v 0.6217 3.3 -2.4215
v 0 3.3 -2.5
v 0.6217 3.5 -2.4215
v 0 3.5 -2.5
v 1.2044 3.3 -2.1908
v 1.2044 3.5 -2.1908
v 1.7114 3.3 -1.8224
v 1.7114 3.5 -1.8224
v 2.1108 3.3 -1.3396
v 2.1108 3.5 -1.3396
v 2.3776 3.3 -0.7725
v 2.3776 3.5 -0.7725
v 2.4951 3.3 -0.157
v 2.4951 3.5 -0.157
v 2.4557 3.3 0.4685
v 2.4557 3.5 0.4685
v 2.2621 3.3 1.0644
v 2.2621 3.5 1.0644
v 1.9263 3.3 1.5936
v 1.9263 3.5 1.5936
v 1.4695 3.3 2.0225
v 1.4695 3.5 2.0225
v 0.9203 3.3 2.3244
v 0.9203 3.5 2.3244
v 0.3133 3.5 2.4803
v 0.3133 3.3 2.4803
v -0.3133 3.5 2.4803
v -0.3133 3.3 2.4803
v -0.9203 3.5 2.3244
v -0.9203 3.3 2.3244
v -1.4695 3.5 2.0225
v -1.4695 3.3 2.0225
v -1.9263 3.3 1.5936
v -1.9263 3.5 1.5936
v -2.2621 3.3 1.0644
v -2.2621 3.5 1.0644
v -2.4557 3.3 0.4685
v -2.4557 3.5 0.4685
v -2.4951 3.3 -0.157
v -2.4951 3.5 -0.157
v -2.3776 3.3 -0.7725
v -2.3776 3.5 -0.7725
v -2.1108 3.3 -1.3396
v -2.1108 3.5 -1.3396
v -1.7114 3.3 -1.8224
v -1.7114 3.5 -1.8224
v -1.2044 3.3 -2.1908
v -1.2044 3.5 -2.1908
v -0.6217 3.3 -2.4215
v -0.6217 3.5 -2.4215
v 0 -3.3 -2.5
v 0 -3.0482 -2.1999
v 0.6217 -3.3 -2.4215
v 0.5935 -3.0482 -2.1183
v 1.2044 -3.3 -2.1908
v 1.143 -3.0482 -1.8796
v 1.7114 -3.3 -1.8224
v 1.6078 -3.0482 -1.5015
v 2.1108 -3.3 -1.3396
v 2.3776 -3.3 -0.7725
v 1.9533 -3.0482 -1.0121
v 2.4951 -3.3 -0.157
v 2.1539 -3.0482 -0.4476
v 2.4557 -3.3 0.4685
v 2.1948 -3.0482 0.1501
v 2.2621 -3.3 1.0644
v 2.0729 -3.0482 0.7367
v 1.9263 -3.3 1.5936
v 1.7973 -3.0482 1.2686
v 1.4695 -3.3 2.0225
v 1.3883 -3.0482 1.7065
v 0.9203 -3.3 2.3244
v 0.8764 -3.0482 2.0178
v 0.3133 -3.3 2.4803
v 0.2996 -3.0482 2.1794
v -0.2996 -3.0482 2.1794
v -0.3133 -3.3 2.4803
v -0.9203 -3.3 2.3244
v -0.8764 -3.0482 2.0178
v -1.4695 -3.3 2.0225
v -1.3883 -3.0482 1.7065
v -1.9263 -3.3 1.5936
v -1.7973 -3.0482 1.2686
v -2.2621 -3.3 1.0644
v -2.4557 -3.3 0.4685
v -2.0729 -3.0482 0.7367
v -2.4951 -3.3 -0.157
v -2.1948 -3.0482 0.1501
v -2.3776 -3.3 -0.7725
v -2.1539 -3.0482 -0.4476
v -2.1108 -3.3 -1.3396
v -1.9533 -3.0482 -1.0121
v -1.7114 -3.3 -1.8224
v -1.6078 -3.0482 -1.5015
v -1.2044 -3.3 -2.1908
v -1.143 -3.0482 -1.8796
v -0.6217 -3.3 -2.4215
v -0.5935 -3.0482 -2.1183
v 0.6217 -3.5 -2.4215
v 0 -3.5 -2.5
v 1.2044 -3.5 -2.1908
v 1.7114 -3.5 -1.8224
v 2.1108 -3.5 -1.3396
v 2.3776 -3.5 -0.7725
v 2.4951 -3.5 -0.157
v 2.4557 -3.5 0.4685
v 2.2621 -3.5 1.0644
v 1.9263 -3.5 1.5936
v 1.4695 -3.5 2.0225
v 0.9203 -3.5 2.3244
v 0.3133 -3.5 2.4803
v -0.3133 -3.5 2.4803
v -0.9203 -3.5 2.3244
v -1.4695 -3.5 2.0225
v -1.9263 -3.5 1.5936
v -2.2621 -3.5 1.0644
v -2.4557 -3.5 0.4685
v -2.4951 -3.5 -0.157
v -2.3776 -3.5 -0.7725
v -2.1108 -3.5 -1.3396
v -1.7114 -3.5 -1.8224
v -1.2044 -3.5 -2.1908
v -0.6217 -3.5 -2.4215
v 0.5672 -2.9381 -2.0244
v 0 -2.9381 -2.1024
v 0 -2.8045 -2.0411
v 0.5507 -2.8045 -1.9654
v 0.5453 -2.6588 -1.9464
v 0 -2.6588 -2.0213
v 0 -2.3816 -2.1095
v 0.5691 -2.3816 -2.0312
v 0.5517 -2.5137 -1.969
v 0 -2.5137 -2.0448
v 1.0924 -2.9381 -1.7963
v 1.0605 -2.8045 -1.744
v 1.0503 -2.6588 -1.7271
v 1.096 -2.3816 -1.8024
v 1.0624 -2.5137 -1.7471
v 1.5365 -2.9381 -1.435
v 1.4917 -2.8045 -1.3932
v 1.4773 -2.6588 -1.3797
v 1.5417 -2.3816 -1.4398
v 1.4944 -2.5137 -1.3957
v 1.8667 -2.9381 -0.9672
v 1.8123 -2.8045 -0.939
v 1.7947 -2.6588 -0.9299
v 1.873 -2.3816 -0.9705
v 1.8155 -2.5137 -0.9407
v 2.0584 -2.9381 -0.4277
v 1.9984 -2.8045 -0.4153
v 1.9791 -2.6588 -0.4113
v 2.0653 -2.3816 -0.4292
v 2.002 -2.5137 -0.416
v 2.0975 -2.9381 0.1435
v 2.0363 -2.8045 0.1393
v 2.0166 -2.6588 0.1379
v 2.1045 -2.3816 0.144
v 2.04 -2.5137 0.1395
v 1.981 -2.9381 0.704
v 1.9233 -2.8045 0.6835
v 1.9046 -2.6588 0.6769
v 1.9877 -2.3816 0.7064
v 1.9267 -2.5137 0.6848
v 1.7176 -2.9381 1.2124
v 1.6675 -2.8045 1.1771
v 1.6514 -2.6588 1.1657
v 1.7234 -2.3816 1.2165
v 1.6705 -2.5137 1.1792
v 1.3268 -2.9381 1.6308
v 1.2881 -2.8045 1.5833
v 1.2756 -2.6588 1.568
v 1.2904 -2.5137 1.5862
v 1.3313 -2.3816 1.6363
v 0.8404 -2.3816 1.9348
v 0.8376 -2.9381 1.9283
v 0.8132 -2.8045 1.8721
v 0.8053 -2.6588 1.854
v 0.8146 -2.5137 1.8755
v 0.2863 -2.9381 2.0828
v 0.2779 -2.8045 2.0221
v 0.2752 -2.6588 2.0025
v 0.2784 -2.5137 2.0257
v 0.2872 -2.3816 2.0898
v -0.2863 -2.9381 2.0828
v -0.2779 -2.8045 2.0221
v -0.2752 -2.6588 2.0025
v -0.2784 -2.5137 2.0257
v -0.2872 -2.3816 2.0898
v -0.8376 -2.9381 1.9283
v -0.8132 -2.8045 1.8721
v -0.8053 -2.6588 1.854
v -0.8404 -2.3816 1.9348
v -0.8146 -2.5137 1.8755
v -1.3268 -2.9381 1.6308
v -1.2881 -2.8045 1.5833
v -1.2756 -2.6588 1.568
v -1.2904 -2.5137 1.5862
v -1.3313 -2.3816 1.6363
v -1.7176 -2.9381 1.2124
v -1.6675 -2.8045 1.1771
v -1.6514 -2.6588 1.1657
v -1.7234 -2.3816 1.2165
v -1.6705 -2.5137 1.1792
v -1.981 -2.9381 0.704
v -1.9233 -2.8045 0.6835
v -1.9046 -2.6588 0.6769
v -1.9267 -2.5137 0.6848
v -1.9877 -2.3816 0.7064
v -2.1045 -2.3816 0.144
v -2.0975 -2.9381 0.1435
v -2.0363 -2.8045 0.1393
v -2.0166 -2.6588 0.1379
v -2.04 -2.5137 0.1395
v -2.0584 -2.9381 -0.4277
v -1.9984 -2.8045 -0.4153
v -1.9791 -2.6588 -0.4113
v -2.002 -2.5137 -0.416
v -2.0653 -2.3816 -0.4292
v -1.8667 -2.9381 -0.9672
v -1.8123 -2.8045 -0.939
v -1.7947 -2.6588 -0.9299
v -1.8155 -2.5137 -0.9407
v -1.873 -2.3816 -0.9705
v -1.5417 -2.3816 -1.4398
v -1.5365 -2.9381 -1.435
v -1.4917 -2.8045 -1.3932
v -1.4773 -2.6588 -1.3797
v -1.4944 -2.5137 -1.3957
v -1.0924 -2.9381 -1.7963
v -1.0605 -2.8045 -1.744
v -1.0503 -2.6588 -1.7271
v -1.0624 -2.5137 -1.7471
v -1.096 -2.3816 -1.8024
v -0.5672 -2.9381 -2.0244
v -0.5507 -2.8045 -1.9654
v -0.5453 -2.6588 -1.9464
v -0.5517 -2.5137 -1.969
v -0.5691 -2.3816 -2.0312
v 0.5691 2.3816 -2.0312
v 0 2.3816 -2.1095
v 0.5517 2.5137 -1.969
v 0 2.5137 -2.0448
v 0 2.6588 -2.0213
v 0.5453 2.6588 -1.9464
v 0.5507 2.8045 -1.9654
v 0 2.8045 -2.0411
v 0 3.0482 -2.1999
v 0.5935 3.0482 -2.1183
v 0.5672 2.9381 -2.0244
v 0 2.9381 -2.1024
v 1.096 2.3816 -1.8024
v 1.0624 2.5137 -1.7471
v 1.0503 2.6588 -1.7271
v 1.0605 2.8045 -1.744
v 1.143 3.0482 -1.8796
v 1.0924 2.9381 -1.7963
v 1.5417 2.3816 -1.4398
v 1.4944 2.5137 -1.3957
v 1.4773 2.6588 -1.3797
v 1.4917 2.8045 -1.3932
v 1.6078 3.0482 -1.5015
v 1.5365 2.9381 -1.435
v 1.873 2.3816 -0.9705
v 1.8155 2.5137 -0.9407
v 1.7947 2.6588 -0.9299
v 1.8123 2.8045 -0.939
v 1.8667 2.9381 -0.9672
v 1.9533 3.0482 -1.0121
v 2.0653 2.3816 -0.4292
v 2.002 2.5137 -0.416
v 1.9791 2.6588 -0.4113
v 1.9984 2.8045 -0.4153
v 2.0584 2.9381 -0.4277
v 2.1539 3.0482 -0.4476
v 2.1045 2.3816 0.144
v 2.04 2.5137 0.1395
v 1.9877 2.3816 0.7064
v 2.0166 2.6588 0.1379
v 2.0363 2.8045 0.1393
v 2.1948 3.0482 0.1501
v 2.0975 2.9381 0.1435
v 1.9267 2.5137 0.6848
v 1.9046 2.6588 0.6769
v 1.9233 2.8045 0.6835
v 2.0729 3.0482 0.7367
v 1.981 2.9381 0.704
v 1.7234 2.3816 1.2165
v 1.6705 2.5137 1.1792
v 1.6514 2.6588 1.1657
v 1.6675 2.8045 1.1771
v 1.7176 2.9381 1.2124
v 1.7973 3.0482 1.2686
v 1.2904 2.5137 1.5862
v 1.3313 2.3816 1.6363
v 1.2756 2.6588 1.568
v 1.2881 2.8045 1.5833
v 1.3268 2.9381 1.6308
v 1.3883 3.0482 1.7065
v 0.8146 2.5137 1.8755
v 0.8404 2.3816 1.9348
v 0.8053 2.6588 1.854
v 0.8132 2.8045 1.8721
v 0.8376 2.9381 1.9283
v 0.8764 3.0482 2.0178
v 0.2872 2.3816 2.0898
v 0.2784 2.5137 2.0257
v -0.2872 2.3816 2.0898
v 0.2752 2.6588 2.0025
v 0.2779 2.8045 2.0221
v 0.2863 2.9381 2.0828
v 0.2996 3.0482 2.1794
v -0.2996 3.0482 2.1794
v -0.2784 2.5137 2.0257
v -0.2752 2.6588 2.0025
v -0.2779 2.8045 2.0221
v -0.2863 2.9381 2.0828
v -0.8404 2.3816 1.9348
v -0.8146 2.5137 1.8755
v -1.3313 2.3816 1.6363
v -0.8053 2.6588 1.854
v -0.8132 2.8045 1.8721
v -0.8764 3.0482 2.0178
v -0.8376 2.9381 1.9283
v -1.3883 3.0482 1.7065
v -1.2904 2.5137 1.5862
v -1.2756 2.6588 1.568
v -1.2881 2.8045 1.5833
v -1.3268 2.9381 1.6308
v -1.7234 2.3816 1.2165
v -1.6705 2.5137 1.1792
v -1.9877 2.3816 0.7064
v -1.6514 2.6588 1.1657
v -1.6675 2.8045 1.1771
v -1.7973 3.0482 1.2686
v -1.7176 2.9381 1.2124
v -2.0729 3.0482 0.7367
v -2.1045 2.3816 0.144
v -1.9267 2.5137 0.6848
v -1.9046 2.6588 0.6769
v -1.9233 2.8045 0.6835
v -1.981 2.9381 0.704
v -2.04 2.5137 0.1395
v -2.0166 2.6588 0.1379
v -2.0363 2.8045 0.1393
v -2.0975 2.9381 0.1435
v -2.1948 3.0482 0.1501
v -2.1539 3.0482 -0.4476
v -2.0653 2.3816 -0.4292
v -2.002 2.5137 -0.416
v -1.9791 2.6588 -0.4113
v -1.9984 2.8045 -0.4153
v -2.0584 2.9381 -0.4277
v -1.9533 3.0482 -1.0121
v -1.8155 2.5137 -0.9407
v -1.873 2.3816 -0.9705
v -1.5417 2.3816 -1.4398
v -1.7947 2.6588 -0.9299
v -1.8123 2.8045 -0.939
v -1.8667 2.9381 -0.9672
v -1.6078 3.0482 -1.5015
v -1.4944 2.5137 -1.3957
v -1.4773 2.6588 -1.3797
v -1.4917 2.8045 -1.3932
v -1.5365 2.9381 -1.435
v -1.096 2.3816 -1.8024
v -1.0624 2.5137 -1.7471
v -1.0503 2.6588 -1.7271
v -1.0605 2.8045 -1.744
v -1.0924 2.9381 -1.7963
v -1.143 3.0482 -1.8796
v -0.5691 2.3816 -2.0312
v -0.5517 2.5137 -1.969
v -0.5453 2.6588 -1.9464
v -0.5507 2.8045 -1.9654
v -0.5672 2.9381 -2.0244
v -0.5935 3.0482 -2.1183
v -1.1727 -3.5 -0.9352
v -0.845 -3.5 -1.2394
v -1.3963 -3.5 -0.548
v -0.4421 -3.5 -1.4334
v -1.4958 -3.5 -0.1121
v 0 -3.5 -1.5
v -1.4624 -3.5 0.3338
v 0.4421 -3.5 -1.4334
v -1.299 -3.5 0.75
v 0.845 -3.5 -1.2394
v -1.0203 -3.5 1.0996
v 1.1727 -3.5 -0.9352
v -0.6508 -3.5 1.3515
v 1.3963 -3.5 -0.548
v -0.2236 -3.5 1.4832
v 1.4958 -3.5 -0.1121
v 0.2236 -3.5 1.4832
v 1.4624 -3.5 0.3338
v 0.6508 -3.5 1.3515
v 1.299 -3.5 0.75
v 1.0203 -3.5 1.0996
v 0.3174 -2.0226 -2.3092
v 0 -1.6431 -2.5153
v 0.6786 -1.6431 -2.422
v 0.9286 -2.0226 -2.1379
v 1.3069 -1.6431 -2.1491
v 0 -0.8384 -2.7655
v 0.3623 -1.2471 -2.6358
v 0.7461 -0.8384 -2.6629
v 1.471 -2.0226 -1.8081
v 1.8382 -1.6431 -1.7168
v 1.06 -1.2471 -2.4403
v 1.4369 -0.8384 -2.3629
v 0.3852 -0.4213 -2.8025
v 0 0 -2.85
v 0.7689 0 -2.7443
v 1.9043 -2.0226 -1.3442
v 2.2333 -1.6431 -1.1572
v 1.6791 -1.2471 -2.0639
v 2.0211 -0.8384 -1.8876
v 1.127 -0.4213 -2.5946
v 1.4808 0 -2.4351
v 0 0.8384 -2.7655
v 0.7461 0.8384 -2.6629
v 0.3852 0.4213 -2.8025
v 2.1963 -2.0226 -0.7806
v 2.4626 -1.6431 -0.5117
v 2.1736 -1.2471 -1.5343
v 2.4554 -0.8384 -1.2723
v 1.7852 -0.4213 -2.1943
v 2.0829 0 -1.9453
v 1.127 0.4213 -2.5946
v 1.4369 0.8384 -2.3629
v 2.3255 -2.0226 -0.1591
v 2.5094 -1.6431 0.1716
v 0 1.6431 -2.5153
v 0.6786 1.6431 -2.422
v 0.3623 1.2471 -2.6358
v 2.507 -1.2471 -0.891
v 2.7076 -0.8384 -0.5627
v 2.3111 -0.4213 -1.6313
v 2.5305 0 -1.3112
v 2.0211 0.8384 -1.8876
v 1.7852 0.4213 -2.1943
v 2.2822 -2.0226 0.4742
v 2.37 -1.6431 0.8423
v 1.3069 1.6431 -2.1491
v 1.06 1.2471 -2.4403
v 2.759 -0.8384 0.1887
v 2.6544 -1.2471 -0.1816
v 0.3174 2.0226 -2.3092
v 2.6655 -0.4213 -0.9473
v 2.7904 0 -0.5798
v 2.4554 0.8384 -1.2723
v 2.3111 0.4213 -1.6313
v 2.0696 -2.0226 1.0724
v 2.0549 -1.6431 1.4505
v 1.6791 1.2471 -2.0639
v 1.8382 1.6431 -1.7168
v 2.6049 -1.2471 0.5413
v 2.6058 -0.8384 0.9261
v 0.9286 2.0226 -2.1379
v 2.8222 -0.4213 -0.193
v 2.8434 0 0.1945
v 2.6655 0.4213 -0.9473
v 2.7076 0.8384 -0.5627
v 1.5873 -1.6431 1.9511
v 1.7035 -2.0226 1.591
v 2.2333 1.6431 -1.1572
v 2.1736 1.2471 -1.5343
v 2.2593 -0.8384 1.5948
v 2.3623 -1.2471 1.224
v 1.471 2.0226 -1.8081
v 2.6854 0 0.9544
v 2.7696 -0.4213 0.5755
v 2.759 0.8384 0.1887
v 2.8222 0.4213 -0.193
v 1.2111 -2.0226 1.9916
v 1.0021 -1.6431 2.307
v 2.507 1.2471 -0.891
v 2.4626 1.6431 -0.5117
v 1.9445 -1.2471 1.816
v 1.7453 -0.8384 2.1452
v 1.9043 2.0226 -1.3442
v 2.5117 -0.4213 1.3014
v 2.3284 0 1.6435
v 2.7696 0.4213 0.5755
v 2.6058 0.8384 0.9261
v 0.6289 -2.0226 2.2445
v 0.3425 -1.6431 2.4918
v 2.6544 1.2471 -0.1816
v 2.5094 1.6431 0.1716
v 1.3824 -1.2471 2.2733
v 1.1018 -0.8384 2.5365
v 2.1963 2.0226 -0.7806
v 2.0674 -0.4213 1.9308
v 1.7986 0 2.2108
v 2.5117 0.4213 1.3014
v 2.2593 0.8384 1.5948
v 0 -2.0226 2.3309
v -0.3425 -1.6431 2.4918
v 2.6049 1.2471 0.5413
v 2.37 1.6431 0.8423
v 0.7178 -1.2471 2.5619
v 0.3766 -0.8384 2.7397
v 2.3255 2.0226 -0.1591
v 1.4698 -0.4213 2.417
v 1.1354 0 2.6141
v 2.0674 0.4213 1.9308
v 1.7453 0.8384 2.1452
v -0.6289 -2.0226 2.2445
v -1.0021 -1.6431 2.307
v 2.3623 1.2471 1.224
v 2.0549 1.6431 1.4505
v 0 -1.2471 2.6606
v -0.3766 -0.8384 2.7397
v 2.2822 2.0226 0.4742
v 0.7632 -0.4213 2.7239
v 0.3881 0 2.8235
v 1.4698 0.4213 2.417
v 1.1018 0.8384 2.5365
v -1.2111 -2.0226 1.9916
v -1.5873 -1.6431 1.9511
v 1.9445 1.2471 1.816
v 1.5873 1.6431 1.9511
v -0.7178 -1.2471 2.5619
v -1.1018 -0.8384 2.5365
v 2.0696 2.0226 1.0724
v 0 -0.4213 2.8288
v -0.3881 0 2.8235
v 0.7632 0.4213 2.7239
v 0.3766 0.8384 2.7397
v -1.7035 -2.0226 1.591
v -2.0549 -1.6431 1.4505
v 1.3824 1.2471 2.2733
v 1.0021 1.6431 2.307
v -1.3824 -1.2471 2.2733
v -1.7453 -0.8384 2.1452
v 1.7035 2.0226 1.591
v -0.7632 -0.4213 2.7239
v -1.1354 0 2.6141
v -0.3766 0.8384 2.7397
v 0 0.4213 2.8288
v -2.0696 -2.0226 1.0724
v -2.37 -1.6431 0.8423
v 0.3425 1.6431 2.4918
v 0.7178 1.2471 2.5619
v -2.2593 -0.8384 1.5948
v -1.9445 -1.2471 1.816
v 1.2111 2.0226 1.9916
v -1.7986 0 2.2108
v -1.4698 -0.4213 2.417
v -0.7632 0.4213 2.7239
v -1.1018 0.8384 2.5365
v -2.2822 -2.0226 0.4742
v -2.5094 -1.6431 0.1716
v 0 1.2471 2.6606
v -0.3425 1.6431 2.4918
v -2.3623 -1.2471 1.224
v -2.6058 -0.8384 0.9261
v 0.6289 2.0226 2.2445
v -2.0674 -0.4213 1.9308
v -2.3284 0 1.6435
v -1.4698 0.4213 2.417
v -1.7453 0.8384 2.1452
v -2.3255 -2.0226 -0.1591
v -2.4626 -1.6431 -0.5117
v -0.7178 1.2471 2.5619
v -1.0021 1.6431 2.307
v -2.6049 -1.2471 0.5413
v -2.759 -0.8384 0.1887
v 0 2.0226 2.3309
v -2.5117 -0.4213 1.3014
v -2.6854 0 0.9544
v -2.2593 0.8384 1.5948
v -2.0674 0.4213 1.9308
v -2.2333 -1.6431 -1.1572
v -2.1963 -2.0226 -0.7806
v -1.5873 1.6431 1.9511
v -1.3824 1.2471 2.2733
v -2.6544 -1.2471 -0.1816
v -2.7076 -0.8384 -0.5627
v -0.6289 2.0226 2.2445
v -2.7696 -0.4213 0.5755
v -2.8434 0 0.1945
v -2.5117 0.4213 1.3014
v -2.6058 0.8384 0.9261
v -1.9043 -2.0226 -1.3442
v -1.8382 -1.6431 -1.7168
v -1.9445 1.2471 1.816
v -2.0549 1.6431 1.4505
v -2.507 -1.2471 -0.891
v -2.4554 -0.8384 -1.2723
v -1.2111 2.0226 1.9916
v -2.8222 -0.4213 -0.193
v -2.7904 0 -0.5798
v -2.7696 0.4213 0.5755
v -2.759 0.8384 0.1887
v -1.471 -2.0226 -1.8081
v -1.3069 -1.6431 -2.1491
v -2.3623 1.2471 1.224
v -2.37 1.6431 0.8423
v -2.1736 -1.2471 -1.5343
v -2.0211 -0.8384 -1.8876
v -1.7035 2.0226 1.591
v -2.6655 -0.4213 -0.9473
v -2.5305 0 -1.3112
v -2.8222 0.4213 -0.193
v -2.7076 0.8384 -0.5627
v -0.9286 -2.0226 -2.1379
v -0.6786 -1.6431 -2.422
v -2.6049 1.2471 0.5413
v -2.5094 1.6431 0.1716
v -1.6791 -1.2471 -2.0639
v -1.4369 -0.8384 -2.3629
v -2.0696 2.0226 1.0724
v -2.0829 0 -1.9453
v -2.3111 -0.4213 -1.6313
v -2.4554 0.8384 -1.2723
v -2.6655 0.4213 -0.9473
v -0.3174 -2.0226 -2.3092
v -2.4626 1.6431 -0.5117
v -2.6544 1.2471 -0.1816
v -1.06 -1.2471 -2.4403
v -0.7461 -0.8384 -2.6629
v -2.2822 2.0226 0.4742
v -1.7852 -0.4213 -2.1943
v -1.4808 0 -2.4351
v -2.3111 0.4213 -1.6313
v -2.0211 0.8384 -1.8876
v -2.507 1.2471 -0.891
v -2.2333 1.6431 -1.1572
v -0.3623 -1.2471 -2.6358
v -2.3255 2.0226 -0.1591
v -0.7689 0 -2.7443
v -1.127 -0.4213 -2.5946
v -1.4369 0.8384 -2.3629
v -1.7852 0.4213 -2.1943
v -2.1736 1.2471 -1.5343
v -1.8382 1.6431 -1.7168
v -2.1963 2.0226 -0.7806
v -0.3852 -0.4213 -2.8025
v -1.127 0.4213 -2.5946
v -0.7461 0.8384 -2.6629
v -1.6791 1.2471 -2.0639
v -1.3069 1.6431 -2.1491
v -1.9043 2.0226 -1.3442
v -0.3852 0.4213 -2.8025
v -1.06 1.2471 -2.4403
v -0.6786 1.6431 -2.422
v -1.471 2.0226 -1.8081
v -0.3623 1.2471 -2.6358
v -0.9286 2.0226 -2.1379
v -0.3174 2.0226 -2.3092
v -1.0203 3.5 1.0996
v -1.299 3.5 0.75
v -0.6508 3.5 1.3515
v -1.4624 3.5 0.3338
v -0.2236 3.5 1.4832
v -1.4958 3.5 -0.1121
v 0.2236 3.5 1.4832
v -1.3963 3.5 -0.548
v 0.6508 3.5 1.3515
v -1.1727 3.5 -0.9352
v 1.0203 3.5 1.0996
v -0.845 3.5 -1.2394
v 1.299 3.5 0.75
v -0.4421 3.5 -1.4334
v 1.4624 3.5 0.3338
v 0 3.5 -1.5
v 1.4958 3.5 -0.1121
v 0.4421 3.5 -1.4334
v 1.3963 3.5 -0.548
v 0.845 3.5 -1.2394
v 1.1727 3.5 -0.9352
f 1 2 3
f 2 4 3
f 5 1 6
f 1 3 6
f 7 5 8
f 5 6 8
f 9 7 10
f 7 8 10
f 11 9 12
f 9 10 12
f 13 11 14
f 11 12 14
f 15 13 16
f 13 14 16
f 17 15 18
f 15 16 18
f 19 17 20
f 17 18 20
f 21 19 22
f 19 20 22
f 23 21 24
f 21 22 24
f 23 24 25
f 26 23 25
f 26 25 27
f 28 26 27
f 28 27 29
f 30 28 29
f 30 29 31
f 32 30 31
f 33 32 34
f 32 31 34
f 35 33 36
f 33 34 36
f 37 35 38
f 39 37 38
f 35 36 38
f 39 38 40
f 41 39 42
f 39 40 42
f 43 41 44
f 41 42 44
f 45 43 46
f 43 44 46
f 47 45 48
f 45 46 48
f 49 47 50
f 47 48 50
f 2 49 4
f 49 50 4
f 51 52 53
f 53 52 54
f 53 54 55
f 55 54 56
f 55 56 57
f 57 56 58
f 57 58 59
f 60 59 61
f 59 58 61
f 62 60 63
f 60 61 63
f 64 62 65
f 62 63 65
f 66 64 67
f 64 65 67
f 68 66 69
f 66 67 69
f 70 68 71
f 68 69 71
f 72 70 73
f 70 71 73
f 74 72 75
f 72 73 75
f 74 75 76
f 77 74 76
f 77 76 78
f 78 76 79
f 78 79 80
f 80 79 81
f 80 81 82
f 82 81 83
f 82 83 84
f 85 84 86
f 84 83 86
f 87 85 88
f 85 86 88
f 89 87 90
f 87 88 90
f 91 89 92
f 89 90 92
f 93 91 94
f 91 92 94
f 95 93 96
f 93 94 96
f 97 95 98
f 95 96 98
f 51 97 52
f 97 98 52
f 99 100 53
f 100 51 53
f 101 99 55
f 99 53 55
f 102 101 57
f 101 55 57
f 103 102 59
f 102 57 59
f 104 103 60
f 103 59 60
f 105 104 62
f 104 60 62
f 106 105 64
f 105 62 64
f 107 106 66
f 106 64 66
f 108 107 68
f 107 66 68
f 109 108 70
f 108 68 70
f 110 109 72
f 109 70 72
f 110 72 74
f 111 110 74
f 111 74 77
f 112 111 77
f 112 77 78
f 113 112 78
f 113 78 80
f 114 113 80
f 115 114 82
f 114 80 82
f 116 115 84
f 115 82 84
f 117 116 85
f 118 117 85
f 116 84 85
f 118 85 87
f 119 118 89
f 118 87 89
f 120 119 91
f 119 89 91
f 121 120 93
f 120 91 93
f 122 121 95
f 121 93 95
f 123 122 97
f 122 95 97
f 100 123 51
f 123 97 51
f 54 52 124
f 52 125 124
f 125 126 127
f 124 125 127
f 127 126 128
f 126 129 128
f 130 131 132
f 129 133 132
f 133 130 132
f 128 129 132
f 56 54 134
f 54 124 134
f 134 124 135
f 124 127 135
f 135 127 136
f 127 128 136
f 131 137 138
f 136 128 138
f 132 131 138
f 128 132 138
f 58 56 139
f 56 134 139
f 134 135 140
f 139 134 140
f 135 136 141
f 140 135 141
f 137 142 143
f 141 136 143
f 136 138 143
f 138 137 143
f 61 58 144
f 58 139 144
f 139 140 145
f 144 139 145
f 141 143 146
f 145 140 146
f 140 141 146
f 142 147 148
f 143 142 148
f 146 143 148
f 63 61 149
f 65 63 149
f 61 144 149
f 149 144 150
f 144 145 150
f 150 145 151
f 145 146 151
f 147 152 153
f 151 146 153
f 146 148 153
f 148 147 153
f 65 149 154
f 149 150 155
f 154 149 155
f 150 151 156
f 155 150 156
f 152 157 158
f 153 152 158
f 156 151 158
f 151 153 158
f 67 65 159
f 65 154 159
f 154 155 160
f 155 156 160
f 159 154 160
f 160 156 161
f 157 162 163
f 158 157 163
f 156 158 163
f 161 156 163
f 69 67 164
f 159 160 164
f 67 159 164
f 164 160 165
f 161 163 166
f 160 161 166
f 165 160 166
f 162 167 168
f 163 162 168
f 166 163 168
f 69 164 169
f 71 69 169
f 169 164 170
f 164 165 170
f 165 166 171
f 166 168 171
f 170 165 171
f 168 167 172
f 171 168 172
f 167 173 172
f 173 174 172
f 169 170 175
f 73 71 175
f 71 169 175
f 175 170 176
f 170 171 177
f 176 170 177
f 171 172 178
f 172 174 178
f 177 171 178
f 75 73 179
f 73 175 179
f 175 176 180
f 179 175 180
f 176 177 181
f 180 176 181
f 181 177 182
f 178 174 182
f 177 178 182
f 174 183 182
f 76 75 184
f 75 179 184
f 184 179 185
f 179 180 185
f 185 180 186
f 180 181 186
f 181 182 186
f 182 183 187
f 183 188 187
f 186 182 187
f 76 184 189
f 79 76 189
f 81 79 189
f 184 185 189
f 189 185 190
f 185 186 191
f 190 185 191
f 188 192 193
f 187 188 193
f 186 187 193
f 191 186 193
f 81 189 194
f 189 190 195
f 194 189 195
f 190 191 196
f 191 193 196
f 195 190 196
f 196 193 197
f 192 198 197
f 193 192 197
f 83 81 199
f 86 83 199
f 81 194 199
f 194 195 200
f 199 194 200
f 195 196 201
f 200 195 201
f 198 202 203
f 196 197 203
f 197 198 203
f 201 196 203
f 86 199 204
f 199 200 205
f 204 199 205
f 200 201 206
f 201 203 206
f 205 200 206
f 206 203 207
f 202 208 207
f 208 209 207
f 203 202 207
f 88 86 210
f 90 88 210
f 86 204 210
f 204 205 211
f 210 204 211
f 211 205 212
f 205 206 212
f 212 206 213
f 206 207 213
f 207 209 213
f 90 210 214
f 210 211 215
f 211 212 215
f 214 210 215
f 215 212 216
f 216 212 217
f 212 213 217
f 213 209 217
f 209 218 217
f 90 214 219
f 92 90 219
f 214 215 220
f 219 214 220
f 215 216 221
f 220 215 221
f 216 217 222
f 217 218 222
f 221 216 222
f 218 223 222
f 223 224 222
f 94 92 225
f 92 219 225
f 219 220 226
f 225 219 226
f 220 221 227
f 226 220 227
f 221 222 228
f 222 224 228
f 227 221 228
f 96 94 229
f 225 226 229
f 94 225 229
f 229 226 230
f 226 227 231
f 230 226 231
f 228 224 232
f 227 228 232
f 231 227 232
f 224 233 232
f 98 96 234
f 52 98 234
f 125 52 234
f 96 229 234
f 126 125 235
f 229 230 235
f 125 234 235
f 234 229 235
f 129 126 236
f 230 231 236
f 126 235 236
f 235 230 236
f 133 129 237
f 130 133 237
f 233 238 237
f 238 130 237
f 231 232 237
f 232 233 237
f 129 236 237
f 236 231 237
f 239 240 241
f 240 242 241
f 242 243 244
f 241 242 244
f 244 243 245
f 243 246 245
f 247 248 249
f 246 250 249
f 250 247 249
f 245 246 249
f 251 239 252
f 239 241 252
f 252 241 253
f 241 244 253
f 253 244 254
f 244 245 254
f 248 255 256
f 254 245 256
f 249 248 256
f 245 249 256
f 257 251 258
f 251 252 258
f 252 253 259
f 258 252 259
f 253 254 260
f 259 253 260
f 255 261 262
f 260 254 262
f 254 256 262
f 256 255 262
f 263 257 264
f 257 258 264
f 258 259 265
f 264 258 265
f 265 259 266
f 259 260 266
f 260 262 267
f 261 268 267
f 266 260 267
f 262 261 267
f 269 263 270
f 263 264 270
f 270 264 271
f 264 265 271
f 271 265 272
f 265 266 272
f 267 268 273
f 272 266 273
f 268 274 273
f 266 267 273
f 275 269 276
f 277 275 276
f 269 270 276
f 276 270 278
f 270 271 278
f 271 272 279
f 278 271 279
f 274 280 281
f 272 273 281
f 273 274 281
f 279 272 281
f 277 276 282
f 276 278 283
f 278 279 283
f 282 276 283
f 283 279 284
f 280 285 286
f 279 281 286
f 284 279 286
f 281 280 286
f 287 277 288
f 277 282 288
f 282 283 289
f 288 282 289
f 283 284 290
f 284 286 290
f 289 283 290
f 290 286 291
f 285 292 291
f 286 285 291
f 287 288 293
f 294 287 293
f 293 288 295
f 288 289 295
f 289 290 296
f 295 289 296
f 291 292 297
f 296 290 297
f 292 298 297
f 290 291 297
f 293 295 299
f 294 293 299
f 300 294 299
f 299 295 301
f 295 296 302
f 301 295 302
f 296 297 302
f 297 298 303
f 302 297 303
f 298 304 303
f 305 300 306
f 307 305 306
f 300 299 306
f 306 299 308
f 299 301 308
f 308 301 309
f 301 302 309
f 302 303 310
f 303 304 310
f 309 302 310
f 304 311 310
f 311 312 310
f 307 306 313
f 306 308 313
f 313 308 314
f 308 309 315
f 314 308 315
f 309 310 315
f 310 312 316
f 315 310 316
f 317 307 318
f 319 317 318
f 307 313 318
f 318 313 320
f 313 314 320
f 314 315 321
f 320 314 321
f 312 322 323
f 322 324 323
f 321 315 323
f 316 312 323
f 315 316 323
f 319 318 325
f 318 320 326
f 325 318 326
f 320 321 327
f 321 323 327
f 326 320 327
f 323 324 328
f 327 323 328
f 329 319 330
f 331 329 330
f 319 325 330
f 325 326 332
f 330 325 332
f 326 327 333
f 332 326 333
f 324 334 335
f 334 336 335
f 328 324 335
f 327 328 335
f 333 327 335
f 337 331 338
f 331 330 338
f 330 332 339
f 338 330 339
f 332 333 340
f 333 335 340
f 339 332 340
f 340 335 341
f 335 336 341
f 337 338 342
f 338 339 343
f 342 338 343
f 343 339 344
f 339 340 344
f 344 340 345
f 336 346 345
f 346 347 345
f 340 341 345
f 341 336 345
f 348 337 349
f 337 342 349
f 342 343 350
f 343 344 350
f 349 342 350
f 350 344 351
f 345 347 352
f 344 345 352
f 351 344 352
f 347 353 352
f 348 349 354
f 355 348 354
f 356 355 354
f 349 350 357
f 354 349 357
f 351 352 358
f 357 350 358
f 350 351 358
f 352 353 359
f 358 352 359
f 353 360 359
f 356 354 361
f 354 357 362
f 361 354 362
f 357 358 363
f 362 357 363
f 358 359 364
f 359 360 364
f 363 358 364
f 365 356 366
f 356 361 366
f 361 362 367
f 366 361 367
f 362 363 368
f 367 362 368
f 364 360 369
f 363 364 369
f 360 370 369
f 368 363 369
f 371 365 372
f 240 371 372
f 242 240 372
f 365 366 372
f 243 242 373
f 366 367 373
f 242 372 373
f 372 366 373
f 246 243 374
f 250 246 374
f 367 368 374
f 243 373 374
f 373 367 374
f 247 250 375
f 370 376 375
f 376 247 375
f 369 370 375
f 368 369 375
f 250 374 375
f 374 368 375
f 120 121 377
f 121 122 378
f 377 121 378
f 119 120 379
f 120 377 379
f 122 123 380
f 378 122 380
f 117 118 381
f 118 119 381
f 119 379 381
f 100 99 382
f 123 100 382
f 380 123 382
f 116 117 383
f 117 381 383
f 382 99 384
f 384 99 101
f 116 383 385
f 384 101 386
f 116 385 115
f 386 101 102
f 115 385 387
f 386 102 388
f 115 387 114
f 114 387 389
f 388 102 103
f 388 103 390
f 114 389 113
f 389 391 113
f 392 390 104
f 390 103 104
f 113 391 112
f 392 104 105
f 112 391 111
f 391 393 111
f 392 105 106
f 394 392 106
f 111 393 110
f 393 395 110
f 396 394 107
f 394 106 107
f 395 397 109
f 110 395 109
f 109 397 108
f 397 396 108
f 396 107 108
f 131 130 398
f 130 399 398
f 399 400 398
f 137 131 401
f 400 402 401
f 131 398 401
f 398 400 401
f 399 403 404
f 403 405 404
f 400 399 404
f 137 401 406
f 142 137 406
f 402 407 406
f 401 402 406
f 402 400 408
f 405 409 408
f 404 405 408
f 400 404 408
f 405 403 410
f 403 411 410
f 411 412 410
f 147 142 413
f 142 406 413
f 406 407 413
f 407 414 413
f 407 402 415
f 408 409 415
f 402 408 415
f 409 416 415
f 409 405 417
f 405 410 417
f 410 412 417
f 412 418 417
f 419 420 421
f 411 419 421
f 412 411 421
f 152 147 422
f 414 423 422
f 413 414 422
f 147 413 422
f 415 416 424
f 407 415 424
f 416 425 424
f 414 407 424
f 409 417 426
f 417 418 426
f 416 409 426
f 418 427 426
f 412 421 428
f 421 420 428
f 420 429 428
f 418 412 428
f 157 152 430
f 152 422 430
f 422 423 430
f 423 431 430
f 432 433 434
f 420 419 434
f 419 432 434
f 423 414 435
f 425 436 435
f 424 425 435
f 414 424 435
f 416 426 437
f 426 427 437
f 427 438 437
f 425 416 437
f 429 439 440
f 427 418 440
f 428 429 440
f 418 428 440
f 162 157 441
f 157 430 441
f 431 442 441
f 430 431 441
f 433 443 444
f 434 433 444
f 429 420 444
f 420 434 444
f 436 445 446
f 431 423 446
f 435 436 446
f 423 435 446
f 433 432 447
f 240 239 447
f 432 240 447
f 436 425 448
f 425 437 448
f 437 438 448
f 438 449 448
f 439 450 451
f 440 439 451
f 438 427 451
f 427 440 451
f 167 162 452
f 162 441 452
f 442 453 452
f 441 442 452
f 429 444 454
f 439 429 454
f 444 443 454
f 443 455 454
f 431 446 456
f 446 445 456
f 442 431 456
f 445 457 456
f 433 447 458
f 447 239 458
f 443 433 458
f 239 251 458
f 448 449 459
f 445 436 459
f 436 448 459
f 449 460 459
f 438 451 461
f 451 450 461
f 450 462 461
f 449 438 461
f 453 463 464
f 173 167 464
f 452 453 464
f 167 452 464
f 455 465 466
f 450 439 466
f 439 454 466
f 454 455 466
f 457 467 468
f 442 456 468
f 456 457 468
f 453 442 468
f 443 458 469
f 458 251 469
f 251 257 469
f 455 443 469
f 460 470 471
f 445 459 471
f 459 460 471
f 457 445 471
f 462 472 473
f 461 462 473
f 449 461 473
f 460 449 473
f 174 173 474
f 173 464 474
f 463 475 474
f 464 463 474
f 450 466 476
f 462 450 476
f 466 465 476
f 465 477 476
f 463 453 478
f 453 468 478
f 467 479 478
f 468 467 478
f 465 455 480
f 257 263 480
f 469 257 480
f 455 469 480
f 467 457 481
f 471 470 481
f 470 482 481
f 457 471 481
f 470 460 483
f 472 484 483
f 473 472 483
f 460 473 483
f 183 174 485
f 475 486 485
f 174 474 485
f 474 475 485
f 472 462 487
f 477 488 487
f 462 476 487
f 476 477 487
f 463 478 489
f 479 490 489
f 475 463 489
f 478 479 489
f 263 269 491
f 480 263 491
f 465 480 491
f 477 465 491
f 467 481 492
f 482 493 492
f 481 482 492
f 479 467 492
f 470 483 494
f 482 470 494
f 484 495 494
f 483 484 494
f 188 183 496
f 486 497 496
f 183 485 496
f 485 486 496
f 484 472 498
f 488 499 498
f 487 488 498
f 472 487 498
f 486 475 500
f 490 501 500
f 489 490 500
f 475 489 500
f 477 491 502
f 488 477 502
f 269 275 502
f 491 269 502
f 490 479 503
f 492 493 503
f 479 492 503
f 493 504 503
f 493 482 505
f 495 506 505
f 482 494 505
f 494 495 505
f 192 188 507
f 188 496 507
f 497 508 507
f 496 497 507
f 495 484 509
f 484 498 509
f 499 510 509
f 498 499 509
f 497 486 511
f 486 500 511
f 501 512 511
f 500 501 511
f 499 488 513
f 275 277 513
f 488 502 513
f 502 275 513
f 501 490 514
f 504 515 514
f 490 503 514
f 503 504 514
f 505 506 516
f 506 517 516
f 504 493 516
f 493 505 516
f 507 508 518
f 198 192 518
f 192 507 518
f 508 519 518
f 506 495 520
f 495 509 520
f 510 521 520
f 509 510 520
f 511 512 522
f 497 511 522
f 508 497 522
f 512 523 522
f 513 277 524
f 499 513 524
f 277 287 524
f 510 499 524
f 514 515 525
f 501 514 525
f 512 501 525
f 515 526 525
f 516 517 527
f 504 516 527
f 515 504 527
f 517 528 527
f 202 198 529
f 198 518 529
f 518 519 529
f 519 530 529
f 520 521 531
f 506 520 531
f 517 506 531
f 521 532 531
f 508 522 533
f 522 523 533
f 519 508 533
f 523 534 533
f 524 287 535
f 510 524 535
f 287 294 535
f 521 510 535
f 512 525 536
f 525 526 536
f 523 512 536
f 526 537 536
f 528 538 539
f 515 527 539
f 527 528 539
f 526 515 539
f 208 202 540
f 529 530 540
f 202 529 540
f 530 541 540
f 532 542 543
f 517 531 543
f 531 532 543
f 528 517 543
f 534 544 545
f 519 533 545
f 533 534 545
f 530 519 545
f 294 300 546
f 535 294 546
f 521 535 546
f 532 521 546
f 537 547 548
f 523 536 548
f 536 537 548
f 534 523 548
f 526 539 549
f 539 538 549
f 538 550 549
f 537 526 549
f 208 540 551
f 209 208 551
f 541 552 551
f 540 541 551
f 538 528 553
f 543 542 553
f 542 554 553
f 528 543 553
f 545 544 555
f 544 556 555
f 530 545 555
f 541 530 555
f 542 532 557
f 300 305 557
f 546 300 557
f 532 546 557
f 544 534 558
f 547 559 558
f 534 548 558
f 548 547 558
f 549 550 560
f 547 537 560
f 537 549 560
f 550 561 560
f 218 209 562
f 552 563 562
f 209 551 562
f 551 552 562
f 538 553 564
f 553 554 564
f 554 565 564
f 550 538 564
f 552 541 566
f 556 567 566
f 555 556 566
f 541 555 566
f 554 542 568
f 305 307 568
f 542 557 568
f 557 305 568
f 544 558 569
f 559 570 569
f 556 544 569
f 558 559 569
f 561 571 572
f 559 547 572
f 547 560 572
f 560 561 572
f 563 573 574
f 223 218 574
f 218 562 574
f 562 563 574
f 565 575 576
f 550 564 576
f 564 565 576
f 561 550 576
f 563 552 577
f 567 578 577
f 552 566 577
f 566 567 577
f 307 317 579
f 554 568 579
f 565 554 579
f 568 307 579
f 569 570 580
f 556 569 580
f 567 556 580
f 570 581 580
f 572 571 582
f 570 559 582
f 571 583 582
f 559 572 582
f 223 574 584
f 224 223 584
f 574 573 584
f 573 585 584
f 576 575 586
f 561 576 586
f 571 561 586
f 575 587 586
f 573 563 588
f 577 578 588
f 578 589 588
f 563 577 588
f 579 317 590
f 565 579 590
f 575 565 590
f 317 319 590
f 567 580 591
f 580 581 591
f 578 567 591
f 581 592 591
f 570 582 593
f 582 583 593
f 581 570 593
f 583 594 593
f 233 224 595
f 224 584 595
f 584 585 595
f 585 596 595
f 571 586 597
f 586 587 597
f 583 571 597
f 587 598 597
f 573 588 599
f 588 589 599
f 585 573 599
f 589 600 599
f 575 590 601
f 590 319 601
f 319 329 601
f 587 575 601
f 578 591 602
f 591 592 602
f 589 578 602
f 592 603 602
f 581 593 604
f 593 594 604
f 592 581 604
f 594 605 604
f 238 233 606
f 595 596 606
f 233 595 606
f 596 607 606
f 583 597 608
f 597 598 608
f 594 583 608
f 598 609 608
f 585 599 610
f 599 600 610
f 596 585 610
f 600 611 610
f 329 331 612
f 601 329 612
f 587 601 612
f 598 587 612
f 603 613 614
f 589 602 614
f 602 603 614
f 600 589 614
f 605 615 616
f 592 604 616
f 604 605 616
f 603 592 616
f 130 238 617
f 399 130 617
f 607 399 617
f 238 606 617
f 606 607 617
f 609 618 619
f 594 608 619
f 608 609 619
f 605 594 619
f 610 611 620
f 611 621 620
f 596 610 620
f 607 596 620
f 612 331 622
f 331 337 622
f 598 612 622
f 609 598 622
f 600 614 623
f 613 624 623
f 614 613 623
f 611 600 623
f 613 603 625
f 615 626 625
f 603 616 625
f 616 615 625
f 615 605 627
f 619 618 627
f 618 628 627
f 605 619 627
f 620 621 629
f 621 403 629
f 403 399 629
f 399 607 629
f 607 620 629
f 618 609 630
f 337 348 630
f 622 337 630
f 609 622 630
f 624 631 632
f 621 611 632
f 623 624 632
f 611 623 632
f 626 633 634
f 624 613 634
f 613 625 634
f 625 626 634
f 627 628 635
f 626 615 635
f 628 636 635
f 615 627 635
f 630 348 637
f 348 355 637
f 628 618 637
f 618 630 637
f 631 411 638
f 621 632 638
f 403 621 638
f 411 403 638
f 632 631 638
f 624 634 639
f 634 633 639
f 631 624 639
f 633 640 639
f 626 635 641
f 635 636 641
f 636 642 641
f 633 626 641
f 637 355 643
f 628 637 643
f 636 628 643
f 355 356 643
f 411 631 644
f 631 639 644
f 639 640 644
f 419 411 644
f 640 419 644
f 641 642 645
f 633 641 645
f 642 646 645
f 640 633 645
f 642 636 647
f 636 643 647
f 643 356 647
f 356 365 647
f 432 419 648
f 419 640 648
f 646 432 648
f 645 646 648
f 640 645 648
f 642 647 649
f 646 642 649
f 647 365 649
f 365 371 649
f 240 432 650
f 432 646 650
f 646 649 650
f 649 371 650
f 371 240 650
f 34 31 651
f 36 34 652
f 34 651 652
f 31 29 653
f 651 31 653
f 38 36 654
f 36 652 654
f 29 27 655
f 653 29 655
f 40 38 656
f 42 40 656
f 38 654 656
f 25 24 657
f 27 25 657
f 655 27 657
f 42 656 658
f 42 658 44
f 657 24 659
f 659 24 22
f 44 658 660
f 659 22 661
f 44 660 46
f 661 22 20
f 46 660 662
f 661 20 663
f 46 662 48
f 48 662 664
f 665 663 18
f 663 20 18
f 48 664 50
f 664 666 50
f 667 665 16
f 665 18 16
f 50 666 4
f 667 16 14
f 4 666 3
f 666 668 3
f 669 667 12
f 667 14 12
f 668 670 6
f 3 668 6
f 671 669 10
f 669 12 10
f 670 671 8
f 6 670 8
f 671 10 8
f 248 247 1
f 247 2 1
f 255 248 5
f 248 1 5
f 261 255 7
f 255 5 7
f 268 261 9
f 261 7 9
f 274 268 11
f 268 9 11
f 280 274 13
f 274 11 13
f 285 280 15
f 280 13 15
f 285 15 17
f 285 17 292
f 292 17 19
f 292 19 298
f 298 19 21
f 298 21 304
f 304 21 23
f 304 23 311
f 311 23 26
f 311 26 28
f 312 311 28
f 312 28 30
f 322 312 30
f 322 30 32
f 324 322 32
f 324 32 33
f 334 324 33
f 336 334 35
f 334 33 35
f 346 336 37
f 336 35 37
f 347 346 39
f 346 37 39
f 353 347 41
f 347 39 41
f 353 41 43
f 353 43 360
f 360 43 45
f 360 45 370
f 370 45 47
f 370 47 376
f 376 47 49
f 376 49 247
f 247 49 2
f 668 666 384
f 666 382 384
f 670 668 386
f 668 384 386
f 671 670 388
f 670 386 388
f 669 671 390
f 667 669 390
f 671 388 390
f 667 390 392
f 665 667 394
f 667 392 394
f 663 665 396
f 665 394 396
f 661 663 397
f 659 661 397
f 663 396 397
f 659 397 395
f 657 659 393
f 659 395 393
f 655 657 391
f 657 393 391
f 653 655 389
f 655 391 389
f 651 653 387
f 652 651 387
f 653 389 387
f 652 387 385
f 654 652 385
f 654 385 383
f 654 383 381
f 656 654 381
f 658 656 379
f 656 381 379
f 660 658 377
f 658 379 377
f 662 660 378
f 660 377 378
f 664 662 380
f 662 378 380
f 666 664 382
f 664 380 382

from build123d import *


with BuildPart() as part:
    # 草图1 → 旋转1 (revolve)
    with BuildSketch(Plane.XY, mode=Mode.PRIVATE) as revolve_1_sk:
        with BuildLine():
            Line((2.5, 3.5), (1.5, 3.5))
            Line((1.5, 3.5), (1.5, -3.5))
            Line((1.5, -3.5), (2.5, -3.5))
            Line((2.5, -3.5), (2.5, -3.3))
            Line((2.5, -3.3), (2.199898792, -3.048185187))
            ThreePointArc((2.199898792, -3.048185187), (2.025833101, -2.732393081), (2.109452959, -2.38163499))
            ThreePointArc((2.109452959, -2.38163499), (2.85, 0), (2.109452959, 2.38163499))
            ThreePointArc((2.109452959, 2.38163499), (2.025833101, 2.732393081), (2.199898792, 3.048185187))
            Line((2.199898792, 3.048185187), (2.5, 3.3))
            Line((2.5, 3.3), (2.5, 3.5))
        make_face()
    revolve(revolve_1_sk.sketch.rotate(Axis((0, 3.5, 0), (0, -1, 0)), 270), axis=Axis((0, 3.5, 0), (0, -1, 0)))


solid = part.part
